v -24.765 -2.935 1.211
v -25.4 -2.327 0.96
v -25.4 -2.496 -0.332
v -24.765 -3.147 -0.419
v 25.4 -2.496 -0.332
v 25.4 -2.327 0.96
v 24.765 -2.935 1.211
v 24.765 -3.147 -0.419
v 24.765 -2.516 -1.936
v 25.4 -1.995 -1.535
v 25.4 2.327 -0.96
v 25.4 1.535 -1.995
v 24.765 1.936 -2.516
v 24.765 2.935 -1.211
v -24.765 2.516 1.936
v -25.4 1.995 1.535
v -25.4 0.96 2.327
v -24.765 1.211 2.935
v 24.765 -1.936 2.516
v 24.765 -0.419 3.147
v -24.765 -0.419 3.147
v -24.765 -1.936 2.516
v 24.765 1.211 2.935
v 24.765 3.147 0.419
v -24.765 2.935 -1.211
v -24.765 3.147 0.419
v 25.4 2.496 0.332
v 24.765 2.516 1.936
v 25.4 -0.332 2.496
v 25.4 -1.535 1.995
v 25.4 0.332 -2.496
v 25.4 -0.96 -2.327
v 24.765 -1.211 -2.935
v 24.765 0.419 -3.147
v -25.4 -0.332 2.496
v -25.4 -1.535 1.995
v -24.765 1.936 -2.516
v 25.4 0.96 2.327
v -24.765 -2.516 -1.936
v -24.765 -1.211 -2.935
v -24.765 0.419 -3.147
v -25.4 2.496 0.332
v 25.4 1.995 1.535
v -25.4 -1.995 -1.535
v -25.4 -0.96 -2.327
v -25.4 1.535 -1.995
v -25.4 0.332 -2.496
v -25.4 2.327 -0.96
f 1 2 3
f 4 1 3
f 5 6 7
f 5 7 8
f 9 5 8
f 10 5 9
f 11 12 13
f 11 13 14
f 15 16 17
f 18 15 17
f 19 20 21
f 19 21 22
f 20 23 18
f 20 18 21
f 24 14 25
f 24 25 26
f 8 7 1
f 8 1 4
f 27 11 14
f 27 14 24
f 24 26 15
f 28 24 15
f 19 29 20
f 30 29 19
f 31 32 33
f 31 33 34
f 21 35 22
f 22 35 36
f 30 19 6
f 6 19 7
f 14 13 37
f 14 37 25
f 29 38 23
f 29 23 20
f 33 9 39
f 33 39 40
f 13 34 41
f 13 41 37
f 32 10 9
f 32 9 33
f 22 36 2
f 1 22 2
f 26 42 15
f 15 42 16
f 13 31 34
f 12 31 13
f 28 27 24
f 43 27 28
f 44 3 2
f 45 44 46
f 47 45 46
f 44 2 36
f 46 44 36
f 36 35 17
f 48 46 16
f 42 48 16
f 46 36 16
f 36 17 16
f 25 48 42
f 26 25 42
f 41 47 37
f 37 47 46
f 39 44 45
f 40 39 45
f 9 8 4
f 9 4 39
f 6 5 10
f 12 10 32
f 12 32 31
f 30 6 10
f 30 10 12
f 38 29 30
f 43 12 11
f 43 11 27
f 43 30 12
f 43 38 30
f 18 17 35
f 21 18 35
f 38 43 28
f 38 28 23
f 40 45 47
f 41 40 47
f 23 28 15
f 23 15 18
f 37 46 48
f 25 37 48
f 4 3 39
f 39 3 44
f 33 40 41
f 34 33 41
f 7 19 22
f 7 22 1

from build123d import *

# Parameters (mm, degrees)
F1_DEPTH = 25.4
F2_SIZE  = 0.635


with BuildPart() as f1:
    # F0 (on Right) → F1 (new body, symmetric)
    with BuildSketch(Plane.YZ):
        Polygon((-0.4185124813, 3.1472960304), (-1.9360904558, 2.5163820749), (-2.9348945562, 1.2112055746), (-3.1472960304, -0.4185124813), (-2.5163820749, -1.9360904558), (-1.2112055746, -2.9348945562), (0.4185124813, -3.1472960304), (1.9360904558, -2.5163820749), (2.9348945562, -1.2112055746), (3.1472960304, 0.4185124813), (2.5163820749, 1.9360904558), (1.2112055746, 2.9348945562), align=None)
    extrude(amount=F1_DEPTH, both=True)

    # F2
    f2_edges = [f1.edges().sort_by_distance(p)[0] for p in [
        (25.4, 1.177301, -2.831839),
        (25.4, 2.435493, -1.863794),
        (25.4, 3.041095, -0.396347),
        (25.4, 2.831839, 1.177301),
        (25.4, 1.863794, 2.435493),
        (25.4, 0.396347, 3.041095),
        (25.4, -1.177301, 2.831839),
        (25.4, -2.435493, 1.863794),
        (25.4, -3.041095, 0.396347),
        (25.4, -2.831839, -1.177301),
        (25.4, -1.863794, -2.435493),
        (25.4, -0.396347, -3.041095),
        (-25.4, 1.177301, -2.831839),
        (-25.4, 2.435493, -1.863794),
        (-25.4, 3.041095, -0.396347),
        (-25.4, 2.831839, 1.177301),
        (-25.4, 1.863794, 2.435493),
        (-25.4, 0.396347, 3.041095),
        (-25.4, -1.177301, 2.831839),
        (-25.4, -2.435493, 1.863794),
        (-25.4, -3.041095, 0.396347),
        (-25.4, -2.831839, -1.177301),
        (-25.4, -1.863794, -2.435493),
        (-25.4, -0.396347, -3.041095),
    ]]
    chamfer(f2_edges, length=F2_SIZE)


solid = f1.part
